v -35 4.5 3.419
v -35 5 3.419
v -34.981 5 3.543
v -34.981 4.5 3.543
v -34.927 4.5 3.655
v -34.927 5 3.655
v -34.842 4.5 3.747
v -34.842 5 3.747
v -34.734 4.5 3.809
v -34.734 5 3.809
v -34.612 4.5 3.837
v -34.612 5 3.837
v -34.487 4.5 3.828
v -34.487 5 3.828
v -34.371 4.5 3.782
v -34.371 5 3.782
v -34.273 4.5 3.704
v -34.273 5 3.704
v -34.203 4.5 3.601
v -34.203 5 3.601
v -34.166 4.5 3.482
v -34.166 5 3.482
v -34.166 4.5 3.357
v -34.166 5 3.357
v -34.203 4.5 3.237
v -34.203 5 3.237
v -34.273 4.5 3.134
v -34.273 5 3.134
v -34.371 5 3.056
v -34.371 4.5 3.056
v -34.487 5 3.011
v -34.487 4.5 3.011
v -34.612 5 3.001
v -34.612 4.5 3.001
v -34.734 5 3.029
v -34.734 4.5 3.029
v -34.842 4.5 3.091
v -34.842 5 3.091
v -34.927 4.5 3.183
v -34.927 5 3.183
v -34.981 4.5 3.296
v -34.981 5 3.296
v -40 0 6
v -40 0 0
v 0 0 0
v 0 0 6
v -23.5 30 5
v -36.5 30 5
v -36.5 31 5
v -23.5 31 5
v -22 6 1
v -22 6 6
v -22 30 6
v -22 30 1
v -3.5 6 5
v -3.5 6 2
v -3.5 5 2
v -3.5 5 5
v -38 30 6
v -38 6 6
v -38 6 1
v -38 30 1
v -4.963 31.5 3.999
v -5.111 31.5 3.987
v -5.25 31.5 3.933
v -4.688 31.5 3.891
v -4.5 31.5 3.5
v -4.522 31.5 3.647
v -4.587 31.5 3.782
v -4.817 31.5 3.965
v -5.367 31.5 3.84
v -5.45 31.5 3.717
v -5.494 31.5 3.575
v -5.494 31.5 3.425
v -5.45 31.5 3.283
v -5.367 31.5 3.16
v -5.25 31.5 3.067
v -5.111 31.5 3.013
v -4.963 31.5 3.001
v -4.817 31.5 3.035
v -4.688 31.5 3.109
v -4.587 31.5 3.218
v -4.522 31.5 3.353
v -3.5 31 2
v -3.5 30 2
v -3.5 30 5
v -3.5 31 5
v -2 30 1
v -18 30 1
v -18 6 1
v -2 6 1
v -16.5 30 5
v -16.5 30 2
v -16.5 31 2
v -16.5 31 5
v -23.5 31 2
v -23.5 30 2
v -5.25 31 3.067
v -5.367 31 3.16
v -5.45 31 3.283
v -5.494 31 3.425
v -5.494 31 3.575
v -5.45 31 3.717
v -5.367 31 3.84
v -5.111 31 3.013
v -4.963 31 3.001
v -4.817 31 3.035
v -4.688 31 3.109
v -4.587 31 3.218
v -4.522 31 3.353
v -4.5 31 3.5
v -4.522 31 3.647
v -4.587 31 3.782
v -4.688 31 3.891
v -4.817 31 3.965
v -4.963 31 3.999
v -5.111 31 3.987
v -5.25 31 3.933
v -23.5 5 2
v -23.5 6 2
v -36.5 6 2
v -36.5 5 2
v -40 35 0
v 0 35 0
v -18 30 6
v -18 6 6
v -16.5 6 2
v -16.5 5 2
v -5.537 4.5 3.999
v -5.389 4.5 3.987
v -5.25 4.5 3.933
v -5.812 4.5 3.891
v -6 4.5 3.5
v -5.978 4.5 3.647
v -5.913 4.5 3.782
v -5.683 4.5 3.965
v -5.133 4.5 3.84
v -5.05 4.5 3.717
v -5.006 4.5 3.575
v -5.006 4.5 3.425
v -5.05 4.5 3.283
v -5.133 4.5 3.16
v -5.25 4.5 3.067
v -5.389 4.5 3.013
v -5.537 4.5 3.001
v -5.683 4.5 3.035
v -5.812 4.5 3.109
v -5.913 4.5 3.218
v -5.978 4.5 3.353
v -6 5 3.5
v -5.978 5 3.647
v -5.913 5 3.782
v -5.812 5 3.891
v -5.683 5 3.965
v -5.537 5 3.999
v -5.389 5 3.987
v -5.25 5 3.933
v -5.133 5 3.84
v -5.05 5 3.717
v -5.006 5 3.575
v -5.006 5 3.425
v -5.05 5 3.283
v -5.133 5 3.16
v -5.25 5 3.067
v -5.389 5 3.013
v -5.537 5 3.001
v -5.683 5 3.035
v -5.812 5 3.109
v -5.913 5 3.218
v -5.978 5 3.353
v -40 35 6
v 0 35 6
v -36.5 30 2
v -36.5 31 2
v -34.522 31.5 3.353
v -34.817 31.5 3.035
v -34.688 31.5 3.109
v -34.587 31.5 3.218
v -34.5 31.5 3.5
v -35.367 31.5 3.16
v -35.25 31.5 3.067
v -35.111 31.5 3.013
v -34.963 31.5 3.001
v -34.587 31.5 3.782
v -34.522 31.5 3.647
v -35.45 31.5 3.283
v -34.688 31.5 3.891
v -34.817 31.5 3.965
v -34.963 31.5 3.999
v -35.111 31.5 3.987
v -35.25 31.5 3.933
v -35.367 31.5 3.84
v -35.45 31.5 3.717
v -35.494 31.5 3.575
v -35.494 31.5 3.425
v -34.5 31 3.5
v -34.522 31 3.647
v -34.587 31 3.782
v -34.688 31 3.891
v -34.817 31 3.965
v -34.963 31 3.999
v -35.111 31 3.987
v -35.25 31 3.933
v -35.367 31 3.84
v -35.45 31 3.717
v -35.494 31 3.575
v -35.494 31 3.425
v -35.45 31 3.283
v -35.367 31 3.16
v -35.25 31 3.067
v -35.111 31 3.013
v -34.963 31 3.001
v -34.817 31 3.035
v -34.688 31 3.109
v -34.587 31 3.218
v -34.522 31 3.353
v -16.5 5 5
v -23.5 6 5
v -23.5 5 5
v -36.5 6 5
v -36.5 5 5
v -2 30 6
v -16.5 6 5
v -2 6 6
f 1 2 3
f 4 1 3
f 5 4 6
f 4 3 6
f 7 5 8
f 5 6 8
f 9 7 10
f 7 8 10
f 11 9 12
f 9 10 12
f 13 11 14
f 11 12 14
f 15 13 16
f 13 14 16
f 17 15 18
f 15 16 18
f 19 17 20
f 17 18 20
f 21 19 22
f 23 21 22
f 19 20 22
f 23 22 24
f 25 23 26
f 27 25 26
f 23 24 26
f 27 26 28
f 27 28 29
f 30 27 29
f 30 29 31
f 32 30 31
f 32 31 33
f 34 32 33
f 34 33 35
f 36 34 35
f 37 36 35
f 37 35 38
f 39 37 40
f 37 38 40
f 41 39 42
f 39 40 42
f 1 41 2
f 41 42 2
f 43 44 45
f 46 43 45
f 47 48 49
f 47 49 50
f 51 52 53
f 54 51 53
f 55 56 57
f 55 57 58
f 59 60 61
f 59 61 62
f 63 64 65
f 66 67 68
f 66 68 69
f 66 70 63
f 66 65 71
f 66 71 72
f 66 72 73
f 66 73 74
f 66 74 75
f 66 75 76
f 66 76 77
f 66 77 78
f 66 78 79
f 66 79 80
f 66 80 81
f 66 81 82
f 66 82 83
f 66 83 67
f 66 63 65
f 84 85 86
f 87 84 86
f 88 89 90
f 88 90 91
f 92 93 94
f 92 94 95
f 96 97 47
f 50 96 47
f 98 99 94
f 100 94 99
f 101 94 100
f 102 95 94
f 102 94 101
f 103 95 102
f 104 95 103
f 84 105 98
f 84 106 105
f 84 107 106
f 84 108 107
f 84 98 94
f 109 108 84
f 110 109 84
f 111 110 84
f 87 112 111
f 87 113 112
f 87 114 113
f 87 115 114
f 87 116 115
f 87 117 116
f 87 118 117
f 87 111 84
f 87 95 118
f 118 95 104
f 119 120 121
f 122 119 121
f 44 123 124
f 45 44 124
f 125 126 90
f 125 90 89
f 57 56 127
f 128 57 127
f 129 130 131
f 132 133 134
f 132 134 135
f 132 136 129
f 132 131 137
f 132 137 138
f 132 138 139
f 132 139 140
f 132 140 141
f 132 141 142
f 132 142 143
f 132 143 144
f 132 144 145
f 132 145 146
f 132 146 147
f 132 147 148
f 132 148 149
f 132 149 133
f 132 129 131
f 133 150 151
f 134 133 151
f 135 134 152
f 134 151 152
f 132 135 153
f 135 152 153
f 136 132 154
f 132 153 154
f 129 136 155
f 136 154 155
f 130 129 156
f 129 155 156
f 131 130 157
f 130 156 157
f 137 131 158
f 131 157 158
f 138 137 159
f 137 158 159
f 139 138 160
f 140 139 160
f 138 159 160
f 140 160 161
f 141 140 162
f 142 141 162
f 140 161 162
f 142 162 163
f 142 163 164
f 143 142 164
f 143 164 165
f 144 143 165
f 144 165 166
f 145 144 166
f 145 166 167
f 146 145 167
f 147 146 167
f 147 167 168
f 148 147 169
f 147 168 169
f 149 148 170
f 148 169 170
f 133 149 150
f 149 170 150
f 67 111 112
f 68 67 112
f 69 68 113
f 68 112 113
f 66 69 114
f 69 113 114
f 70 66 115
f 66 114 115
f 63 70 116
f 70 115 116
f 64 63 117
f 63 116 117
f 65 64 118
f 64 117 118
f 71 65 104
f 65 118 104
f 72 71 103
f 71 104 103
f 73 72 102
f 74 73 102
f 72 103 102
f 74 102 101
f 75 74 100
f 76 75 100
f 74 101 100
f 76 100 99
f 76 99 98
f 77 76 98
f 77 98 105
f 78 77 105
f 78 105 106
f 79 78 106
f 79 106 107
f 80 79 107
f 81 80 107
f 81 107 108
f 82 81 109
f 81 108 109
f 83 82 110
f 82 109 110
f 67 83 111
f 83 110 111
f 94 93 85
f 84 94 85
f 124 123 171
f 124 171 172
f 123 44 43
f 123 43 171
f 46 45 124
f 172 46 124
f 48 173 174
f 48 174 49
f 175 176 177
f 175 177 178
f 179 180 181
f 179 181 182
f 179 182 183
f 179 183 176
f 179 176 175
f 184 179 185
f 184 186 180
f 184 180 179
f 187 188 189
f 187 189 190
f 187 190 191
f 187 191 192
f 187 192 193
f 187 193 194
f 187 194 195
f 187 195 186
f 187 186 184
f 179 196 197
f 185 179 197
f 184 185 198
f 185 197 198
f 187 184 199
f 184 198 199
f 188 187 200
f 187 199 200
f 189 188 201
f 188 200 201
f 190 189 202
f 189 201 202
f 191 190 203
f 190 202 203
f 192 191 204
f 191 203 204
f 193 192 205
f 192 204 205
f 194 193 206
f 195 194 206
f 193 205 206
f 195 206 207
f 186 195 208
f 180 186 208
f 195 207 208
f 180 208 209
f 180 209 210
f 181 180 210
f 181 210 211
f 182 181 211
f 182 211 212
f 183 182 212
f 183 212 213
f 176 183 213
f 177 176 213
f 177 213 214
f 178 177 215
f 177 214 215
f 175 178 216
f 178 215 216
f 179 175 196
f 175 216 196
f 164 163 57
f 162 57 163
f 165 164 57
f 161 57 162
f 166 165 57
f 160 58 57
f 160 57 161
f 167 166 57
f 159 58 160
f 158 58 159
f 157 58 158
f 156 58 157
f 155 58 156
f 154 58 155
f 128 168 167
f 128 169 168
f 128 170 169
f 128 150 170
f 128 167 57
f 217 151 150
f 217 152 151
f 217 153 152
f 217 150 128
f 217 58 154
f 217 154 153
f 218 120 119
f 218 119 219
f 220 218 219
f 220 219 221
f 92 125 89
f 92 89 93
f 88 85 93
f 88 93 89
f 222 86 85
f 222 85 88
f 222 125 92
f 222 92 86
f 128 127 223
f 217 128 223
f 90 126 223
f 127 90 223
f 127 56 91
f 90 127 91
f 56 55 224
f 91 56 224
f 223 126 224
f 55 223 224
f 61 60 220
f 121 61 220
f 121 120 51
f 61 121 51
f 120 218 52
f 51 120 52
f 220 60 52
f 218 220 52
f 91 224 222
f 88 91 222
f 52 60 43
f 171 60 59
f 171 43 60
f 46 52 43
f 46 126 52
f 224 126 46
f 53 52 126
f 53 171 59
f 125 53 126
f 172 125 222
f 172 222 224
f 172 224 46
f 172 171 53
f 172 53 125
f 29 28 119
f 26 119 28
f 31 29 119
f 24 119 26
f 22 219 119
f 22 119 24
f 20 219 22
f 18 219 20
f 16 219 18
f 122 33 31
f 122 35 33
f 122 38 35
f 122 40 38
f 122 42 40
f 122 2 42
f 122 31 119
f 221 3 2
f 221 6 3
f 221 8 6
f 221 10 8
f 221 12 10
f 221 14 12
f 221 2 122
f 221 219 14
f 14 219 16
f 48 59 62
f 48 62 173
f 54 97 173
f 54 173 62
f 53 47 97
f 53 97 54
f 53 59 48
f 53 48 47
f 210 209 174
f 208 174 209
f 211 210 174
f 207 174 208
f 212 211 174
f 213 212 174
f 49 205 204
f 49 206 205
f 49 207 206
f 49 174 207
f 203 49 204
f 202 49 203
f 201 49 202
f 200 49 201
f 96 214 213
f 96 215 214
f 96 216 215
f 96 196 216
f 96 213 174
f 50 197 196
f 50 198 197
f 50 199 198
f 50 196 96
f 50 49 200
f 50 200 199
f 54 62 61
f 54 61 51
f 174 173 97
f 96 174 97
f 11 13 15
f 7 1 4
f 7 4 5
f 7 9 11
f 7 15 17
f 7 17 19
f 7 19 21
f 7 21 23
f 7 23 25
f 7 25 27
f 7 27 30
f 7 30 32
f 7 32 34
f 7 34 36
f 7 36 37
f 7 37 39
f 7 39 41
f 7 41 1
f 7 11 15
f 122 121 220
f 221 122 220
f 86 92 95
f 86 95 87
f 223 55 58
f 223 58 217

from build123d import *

# Parameters (mm, degrees)
F0_W          = 40
F0_H          = 35
F1_DEPTH      = 6
F2_W          = 16
F2_H          = 24
F3_DEPTH      = 5
F4_W          = 13
F4_H          = 3
F5_DEPTH      = 1
F5_DEPTH_BACK = 2
F6_R          = 0.5
F7_DEPTH      = 0.5
F8_W          = 13
F8_H          = 3
F9_DEPTH      = 1
F9_DEPTH_BACK = 1
F10_R         = 0.5
F10_R_2       = 0.4192188994
F11_DEPTH     = 0.5


with BuildPart() as f1:
    # F0 (on Top) → F1 (new body)
    with BuildSketch(Plane.XY):
        with Locations((-20, 17.5)):
            Rectangle(F0_W, F0_H)
    extrude(amount=F1_DEPTH)

    # F2 (on face) → F3 (cut)
    with BuildSketch(Plane.XY.offset(6)):
        with Locations((-30, 18)):
            Rectangle(F2_W, F2_H)
        with Locations((-10, 18)):
            Rectangle(F2_W, F2_H)
    extrude(amount=-F3_DEPTH, mode=Mode.SUBTRACT)

    # F4 (on face) → F5 (cut, two sides)
    with BuildSketch(Plane.XZ.offset(-30)) as f5_sk:
        with Locations((-30, 3.5)):
            Rectangle(F4_W, F4_H)
        with Locations((-10, 3.5)):
            Rectangle(F4_W, F4_H)
    extrude(amount=-F5_DEPTH, mode=Mode.SUBTRACT)
    extrude(f5_sk.sketch, amount=F5_DEPTH_BACK, mode=Mode.SUBTRACT)

    # F6 (on face) → F7 (cut)
    with BuildSketch(Plane.XZ.offset(-31)):
        with Locations((-35, 3.5)):
            Circle(F6_R)
        with Locations((-5, 3.5)):
            Circle(F6_R)
    extrude(amount=-F7_DEPTH, mode=Mode.SUBTRACT)

    # F8 (on face) → F9 (cut, two sides)
    with BuildSketch(Plane(origin=(0, 6, 0), x_dir=(-1, 0, 0), z_dir=(0, 1, 0))) as f9_sk:
        with Locations((10, 3.5)):
            Rectangle(F8_W, F8_H)
        with Locations((30, 3.5)):
            Rectangle(F8_W, F8_H)
    extrude(amount=-F9_DEPTH, mode=Mode.SUBTRACT)
    extrude(f9_sk.sketch, amount=F9_DEPTH_BACK, mode=Mode.SUBTRACT)

    # F10 (on face) → F11 (cut)
    with BuildSketch(Plane(origin=(0, 5, 0), x_dir=(-1, 0, 0), z_dir=(0, 1, 0))):
        with Locations((5.5, 3.5)):
            Circle(F10_R)
        with Locations((34.5807811006, 3.4192188994)):
            Circle(F10_R_2)
    extrude(amount=-F11_DEPTH, mode=Mode.SUBTRACT)


solid = f1.part
